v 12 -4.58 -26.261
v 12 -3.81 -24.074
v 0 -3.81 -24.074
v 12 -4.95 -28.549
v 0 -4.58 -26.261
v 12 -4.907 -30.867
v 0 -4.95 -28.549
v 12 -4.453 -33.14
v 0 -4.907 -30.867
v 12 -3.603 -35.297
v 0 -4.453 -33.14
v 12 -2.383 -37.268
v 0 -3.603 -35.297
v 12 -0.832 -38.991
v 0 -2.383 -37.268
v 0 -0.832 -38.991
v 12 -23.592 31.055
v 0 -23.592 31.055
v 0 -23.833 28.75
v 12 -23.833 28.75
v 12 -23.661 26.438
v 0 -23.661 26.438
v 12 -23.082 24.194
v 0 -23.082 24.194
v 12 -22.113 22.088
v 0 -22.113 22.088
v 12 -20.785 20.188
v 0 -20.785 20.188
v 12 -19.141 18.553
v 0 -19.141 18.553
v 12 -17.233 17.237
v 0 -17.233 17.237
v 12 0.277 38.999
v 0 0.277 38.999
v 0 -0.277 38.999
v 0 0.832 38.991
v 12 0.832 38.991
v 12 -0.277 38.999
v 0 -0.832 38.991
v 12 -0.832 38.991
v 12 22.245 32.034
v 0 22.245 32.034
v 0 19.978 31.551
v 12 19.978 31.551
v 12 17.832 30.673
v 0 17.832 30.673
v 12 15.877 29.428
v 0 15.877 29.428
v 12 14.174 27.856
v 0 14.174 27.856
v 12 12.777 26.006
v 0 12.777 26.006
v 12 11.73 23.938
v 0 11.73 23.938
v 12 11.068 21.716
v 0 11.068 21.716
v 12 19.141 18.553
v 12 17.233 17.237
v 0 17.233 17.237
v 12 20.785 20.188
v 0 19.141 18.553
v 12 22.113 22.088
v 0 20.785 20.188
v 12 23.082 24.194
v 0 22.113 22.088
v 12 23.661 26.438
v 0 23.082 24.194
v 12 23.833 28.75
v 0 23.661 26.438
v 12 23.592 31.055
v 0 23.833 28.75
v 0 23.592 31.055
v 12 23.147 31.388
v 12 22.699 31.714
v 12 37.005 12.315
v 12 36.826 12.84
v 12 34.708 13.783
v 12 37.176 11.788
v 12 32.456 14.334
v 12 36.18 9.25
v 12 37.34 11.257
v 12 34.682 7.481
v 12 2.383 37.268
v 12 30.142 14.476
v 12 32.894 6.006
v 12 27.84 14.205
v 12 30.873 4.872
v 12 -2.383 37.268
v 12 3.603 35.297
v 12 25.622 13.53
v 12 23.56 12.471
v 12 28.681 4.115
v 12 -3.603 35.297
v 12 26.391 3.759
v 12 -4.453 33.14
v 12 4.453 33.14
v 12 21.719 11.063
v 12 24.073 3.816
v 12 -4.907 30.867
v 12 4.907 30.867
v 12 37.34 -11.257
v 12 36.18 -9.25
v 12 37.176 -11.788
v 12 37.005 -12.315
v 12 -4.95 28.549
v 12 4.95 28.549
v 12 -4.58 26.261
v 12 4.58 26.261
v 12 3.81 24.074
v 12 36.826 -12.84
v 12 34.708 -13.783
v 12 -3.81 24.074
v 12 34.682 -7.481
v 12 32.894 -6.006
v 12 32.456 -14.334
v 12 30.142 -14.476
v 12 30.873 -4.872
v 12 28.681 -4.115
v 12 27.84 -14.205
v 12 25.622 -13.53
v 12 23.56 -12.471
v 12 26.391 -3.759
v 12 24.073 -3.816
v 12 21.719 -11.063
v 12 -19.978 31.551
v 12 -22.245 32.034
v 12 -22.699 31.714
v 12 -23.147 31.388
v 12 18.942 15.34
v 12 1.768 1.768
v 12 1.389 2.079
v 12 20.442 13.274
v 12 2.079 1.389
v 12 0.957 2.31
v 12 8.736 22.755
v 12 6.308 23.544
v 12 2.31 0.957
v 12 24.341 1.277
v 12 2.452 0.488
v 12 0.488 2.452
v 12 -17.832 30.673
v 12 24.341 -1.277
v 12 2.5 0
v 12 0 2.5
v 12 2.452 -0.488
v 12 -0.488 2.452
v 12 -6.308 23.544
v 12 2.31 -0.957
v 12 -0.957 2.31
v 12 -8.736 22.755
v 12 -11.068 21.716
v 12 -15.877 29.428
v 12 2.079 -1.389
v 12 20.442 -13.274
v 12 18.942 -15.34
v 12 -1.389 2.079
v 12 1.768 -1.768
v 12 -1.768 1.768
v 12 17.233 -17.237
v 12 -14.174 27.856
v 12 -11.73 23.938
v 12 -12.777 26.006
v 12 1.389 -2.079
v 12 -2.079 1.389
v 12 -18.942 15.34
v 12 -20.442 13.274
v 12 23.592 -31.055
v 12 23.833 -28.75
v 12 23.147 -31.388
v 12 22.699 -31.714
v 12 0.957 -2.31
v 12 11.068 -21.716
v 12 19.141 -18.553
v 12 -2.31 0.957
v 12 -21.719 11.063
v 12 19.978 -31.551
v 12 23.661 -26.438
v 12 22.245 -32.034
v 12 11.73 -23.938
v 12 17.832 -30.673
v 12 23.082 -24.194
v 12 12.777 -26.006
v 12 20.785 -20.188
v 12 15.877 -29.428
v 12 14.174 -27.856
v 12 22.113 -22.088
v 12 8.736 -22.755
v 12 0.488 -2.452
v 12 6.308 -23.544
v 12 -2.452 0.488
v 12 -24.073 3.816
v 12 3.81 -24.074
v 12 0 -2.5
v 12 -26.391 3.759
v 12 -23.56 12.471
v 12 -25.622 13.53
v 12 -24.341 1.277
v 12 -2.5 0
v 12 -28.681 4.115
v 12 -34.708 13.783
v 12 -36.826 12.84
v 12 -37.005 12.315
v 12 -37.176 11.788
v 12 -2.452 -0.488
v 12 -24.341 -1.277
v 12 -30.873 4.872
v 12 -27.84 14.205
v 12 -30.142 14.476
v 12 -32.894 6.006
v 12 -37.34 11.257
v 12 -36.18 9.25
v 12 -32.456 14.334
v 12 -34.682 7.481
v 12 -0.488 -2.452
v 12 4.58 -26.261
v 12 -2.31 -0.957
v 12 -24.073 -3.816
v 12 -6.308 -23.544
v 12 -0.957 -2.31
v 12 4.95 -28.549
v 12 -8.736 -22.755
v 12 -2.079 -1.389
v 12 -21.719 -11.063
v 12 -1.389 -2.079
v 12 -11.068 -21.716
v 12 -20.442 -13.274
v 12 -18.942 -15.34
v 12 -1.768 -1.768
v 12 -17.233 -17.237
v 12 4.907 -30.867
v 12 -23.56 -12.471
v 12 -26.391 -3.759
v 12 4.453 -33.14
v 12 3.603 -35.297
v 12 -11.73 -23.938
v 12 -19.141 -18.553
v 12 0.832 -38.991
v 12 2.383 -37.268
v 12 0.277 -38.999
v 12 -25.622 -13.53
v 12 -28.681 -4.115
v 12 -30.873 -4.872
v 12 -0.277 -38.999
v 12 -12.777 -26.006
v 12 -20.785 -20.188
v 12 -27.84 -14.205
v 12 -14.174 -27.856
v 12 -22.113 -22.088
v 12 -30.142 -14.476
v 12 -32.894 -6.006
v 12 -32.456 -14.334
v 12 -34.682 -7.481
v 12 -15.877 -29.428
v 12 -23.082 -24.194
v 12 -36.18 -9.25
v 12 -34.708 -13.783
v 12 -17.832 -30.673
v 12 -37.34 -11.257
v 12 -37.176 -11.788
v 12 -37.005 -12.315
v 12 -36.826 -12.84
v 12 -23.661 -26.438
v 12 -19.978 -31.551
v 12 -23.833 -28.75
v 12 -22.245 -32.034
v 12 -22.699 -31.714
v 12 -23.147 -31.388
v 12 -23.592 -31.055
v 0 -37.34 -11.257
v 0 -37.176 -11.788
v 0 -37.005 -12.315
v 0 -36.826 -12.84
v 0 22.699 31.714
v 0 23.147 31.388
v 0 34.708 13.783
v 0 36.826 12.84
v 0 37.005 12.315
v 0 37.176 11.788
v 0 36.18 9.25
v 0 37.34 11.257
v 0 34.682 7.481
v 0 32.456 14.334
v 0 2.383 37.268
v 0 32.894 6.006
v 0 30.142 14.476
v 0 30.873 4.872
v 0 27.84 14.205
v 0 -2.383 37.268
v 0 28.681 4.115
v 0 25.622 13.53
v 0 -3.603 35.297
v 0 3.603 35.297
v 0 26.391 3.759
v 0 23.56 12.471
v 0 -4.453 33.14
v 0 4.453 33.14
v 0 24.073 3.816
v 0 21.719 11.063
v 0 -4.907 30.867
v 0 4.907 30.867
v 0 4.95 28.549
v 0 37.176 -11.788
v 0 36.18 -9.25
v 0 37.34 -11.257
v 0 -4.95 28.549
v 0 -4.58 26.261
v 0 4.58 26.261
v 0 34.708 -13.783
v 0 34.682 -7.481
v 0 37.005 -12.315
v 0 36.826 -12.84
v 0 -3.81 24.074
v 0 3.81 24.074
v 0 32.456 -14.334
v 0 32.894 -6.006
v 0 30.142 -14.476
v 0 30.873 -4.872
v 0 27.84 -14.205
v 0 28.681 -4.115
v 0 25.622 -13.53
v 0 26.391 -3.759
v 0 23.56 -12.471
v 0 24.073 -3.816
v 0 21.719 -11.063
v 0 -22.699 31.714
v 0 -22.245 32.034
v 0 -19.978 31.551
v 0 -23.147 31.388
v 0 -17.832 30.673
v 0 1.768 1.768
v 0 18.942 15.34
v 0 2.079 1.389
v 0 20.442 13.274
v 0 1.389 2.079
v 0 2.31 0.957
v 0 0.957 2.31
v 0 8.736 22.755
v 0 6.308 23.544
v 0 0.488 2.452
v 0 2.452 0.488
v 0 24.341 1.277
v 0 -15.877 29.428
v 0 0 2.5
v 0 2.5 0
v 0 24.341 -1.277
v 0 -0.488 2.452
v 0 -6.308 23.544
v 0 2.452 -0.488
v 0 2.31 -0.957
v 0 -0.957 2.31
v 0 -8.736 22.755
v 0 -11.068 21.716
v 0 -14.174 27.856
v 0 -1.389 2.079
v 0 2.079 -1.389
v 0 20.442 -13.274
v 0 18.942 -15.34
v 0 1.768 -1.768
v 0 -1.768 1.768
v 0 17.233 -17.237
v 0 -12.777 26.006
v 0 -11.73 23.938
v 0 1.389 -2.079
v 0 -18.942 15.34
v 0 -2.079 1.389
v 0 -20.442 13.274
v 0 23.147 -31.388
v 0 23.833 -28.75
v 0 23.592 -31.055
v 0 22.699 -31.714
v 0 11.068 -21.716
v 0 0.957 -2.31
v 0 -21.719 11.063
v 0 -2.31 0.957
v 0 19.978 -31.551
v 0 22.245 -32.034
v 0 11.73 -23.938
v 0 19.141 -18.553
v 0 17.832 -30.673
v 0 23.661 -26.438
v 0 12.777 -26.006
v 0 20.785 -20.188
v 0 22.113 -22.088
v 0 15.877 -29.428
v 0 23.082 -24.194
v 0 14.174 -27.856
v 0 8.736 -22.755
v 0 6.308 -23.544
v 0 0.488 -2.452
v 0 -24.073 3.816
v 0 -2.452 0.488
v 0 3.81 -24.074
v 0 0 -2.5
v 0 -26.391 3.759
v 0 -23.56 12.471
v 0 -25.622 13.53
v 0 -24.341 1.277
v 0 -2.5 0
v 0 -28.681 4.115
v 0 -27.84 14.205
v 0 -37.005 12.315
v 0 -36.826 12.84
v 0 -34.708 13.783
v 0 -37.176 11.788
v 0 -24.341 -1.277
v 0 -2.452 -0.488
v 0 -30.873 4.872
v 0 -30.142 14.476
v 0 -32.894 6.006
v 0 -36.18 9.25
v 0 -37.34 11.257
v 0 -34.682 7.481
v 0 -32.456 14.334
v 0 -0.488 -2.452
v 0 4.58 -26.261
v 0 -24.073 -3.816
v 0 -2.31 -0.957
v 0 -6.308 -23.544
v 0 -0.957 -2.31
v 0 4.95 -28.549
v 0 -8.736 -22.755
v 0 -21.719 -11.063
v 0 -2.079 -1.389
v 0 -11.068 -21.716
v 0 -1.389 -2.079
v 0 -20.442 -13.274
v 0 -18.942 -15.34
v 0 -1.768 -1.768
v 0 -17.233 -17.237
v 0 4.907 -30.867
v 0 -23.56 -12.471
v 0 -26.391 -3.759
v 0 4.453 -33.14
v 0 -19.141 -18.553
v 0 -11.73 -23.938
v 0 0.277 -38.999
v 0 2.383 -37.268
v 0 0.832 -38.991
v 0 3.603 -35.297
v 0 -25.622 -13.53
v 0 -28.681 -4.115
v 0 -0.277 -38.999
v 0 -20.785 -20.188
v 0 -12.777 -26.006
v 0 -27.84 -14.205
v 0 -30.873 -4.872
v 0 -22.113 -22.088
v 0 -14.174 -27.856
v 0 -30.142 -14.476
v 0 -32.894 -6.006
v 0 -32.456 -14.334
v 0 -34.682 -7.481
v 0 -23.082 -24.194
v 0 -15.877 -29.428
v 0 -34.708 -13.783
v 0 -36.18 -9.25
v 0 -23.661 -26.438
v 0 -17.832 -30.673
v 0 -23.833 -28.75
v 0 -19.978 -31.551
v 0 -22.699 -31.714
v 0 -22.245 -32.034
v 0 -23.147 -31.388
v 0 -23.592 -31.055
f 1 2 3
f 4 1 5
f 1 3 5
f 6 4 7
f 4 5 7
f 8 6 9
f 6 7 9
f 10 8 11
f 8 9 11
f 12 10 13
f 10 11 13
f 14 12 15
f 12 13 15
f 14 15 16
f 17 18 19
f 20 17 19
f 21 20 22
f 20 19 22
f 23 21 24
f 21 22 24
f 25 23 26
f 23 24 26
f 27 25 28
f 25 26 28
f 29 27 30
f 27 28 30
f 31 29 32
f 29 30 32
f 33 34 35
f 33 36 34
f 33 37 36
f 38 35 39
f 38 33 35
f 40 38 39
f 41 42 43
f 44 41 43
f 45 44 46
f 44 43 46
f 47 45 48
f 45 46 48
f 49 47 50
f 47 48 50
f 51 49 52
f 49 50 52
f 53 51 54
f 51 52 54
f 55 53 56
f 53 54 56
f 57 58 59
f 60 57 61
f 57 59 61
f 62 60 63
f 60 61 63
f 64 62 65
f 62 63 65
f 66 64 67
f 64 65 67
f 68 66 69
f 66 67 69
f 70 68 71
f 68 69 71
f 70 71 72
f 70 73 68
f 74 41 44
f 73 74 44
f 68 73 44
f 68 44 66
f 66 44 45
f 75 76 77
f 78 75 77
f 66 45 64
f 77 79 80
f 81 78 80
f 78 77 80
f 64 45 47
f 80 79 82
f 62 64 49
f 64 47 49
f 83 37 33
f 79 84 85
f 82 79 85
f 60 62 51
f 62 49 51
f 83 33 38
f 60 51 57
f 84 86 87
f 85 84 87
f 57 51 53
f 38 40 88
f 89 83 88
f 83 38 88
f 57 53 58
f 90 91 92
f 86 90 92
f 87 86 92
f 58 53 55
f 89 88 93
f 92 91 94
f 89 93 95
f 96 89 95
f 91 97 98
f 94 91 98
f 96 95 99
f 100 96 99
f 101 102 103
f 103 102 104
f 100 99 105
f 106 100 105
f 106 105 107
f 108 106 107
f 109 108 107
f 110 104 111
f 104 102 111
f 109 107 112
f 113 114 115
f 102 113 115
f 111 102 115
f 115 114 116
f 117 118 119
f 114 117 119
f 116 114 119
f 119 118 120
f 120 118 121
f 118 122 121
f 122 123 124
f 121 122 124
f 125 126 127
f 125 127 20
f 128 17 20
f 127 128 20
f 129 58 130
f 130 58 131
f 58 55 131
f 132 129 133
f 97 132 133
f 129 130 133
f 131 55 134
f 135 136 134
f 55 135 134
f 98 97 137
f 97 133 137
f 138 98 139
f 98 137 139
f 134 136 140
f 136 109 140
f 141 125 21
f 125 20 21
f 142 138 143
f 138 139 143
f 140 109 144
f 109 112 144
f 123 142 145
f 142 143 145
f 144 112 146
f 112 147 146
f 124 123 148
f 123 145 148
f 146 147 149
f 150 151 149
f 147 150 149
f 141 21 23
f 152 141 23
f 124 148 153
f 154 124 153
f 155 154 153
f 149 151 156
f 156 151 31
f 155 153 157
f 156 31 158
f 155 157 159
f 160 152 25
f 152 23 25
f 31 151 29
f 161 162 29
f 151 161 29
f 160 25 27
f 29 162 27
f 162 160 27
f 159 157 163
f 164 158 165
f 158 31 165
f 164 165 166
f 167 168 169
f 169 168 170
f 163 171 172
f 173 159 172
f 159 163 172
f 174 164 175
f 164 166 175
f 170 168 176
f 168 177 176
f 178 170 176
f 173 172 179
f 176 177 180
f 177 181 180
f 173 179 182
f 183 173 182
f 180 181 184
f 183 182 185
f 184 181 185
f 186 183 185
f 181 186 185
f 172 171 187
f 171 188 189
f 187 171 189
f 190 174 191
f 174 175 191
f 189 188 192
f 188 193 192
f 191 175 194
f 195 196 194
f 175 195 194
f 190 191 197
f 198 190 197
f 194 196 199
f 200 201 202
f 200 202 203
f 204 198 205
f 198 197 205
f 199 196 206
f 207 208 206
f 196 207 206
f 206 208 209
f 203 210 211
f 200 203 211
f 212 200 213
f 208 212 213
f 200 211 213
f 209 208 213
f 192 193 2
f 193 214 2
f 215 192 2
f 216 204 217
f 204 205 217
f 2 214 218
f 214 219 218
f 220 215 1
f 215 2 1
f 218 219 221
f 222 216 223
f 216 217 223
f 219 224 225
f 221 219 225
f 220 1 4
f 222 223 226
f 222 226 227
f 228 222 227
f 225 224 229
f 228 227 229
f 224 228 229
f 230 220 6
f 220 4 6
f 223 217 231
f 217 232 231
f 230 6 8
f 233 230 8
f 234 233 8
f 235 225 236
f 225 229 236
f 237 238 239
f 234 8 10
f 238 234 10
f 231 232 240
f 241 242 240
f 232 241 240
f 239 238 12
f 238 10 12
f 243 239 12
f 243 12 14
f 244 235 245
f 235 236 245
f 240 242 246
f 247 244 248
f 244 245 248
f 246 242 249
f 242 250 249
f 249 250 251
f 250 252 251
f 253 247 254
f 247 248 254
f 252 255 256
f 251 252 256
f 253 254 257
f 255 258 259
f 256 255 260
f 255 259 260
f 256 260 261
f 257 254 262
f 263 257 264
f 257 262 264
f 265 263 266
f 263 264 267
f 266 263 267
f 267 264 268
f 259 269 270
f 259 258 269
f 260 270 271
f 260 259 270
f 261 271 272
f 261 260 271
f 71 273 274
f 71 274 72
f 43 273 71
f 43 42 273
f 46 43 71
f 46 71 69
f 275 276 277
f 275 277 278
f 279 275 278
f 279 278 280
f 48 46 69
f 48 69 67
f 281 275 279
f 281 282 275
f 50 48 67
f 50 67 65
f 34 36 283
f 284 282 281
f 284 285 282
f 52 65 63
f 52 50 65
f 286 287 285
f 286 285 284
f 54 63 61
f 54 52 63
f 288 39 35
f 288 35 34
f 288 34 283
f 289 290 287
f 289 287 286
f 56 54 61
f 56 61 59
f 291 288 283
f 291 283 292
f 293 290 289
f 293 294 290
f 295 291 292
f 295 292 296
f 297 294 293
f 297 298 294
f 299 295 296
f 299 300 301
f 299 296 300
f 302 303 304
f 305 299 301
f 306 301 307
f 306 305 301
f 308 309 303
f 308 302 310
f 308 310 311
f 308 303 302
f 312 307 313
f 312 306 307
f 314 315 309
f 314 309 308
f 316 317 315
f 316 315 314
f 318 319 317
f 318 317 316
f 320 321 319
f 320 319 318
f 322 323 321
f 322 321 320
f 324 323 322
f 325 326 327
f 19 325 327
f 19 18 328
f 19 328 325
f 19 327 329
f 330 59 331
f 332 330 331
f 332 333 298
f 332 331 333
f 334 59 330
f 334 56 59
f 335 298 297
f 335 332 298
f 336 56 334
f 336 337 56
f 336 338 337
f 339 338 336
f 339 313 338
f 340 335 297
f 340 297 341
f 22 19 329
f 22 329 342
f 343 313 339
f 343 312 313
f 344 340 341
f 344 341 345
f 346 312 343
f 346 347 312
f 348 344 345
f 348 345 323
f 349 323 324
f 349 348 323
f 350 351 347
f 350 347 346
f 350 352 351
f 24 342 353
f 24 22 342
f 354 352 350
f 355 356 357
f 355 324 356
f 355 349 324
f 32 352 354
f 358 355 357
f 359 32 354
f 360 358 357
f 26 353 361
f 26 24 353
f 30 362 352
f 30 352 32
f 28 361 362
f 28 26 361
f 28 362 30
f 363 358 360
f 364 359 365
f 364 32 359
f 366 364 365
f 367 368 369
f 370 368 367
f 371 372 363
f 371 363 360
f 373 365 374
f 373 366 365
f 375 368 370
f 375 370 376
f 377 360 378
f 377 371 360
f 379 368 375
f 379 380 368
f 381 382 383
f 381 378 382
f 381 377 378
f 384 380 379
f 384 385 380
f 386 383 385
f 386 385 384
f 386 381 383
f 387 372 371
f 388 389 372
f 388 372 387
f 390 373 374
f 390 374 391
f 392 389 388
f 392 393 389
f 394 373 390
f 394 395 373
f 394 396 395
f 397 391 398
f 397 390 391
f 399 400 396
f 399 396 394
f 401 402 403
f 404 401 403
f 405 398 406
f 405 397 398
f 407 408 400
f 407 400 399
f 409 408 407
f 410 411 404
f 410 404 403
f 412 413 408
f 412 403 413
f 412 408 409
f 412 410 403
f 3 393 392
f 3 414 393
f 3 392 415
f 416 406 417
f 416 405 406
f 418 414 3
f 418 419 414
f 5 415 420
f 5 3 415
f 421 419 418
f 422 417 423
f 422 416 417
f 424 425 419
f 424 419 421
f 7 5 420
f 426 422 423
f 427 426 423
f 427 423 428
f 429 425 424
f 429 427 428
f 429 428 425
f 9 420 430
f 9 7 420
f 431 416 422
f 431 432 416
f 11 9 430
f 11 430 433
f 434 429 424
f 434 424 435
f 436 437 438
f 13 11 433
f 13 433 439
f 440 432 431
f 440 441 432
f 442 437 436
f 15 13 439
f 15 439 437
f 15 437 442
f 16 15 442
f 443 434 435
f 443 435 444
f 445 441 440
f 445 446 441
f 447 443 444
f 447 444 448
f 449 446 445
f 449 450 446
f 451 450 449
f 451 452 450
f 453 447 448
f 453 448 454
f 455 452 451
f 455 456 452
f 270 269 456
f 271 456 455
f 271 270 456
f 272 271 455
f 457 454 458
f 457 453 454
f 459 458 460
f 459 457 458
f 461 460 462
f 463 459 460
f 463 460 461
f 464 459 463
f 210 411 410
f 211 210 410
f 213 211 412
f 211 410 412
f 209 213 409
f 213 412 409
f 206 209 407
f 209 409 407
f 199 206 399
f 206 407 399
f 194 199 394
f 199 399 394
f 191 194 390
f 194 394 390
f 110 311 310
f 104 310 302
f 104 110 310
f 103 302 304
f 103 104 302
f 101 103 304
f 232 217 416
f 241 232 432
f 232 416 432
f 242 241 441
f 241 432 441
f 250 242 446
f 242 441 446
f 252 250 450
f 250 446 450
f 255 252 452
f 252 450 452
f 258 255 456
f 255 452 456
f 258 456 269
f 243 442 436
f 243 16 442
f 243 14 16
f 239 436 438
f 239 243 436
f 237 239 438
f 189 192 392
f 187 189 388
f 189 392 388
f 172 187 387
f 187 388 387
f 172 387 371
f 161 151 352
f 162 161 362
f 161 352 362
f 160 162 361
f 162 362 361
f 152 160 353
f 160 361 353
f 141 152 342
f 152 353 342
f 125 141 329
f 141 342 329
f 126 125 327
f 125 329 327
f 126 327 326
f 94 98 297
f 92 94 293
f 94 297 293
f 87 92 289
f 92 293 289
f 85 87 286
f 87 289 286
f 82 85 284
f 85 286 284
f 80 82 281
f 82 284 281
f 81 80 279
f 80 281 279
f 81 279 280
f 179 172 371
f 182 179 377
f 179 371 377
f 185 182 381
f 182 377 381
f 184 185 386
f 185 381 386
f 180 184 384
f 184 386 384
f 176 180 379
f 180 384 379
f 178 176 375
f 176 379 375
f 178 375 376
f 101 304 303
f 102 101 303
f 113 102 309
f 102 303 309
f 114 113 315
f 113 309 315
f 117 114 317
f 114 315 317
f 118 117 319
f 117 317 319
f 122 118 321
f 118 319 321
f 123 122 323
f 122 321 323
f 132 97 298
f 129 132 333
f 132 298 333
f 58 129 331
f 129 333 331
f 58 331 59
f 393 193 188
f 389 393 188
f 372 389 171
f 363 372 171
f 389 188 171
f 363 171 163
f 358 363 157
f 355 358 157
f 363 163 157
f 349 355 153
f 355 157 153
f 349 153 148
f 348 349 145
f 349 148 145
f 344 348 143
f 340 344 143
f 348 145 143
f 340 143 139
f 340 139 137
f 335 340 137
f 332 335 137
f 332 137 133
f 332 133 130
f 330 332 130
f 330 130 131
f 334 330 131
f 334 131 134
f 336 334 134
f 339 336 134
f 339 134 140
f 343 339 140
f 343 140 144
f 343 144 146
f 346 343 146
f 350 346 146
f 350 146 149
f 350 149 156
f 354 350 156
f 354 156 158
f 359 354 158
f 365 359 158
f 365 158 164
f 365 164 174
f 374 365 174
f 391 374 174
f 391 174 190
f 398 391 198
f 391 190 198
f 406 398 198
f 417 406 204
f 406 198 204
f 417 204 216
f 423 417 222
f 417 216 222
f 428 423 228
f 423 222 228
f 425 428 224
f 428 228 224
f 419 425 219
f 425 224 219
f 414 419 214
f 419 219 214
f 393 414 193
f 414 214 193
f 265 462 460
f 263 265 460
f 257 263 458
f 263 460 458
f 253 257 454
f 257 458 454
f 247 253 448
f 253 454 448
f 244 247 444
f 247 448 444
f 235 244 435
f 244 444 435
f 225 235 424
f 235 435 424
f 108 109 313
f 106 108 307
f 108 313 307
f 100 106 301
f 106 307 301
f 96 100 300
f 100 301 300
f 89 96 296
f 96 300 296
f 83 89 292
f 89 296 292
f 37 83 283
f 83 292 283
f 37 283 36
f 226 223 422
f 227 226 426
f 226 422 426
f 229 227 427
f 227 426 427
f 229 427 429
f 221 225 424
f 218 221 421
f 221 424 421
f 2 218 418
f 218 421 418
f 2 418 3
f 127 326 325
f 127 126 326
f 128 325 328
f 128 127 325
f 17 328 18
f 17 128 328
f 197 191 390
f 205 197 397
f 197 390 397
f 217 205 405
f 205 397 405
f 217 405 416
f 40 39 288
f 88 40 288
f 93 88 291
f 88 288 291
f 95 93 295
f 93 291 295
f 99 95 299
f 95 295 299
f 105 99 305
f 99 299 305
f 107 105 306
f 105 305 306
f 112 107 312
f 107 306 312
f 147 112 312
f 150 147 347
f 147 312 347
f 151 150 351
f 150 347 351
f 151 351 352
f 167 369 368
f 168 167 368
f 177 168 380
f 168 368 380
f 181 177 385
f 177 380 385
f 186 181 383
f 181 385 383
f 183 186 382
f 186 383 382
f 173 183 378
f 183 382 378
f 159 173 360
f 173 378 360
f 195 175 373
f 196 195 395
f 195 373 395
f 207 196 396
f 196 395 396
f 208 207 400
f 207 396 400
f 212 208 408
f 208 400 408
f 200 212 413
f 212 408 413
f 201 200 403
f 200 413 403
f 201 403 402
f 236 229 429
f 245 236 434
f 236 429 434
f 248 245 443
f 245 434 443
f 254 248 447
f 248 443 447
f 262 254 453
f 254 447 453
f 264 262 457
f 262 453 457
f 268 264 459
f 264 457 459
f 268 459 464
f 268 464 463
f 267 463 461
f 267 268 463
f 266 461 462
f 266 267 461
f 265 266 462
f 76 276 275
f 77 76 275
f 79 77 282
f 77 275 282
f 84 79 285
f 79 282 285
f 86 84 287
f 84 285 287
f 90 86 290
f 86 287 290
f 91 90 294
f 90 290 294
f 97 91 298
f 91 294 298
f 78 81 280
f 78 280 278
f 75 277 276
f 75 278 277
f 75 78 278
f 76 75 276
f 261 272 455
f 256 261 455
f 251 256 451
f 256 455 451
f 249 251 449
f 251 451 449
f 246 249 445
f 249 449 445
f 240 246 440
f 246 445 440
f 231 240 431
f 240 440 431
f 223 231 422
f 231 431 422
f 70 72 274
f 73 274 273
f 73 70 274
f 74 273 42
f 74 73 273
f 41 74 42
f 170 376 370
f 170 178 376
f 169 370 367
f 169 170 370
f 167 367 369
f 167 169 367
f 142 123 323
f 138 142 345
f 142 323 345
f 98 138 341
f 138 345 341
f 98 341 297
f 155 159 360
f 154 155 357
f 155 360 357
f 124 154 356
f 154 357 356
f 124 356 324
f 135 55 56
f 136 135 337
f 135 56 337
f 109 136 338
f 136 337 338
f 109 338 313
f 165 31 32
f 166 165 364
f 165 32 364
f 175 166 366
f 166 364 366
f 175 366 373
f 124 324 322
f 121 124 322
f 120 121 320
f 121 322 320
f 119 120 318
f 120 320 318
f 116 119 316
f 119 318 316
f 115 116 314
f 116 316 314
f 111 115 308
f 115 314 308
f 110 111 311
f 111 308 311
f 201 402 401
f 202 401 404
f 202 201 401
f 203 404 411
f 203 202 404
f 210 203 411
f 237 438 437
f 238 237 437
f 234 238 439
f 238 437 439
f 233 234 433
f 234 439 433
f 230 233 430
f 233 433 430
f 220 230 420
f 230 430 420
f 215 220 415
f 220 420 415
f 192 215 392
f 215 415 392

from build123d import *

# Parameters (mm, degrees)
BASPROSKE_W           = 12
BASPROSKE_H           = 39
TOOTHCUT_DEPTH        = 57.444663167
TEETHCUTS_COUNT       = 10
TEETHCUTS_ANGLE       = 324
BORSKE_R              = 1.5
BORE_DEPTH            = 50.0000508
CROQUIS1_R            = 2.5
CORTAR_EXTRUIR1_DEPTH = 56.31066802


with BuildPart() as part:
    # BasProSke → Base-Revolve (revolve)
    with BuildSketch(Plane(origin=(0, 0, 0), x_dir=(1, 0, 0), z_dir=(0, 1, 0)), mode=Mode.PRIVATE) as base_revolve_sk:
        with Locations((6, 19.5)):
            Rectangle(BASPROSKE_W, BASPROSKE_H)
    revolve(base_revolve_sk.sketch.rotate(Axis((-10, 0, 0), (1, 0, 0)), 180), axis=Axis((-10, 0, 0), (1, 0, 0)))

    # TooCutSke → ToothCut (cut, through all)
    with BuildSketch(Plane(origin=(0, 0, 0), x_dir=(0, 0, -1), z_dir=(1, 0, 0))):
        with BuildLine():
            ThreePointArc((3.815775932, 24.073465269), (0, 24.374), (-3.815775932, 24.073465269))
            ThreePointArc((-3.815775932, 24.073465269), (-5.403120307, 31.925375456), (-11.292153099, 37.355978418))
            ThreePointArc((-11.292153099, 37.355978418), (0, 39.0254), (11.292153099, 37.355978418))
            ThreePointArc((11.292153099, 37.355978418), (5.403120307, 31.925375456), (3.815775932, 24.073465269))
        make_face()
    toothcut = extrude(amount=TOOTHCUT_DEPTH, mode=Mode.SUBTRACT)

    # TeethCuts: ToothCut ×10 about axis
    teethcuts_axis = Axis((-10, 0, 0), (1, 0, 0))
    for i in range(1, TEETHCUTS_COUNT):
        add(toothcut.rotate(teethcuts_axis, i * TEETHCUTS_ANGLE / (TEETHCUTS_COUNT - 1)), mode=Mode.SUBTRACT)

    # BorSke → Bore (cut, symmetric)
    with BuildSketch(Plane(origin=(0, 0, 0), x_dir=(0, 0, -1), z_dir=(1, 0, 0))):
        with Locations(Location((0, 0, 0), (0, 0, 180))):
            Circle(BORSKE_R)
    extrude(amount=BORE_DEPTH, both=True, mode=Mode.SUBTRACT)

    # Croquis1 → Cortar-Extruir1 (cut, through all)
    with BuildSketch(Plane.YZ.offset(12)):
        with Locations(Location((0, 0, 0), (0, 0, 270))):
            Circle(CROQUIS1_R)
    extrude(amount=-CORTAR_EXTRUIR1_DEPTH, mode=Mode.SUBTRACT)


solid = part.part
